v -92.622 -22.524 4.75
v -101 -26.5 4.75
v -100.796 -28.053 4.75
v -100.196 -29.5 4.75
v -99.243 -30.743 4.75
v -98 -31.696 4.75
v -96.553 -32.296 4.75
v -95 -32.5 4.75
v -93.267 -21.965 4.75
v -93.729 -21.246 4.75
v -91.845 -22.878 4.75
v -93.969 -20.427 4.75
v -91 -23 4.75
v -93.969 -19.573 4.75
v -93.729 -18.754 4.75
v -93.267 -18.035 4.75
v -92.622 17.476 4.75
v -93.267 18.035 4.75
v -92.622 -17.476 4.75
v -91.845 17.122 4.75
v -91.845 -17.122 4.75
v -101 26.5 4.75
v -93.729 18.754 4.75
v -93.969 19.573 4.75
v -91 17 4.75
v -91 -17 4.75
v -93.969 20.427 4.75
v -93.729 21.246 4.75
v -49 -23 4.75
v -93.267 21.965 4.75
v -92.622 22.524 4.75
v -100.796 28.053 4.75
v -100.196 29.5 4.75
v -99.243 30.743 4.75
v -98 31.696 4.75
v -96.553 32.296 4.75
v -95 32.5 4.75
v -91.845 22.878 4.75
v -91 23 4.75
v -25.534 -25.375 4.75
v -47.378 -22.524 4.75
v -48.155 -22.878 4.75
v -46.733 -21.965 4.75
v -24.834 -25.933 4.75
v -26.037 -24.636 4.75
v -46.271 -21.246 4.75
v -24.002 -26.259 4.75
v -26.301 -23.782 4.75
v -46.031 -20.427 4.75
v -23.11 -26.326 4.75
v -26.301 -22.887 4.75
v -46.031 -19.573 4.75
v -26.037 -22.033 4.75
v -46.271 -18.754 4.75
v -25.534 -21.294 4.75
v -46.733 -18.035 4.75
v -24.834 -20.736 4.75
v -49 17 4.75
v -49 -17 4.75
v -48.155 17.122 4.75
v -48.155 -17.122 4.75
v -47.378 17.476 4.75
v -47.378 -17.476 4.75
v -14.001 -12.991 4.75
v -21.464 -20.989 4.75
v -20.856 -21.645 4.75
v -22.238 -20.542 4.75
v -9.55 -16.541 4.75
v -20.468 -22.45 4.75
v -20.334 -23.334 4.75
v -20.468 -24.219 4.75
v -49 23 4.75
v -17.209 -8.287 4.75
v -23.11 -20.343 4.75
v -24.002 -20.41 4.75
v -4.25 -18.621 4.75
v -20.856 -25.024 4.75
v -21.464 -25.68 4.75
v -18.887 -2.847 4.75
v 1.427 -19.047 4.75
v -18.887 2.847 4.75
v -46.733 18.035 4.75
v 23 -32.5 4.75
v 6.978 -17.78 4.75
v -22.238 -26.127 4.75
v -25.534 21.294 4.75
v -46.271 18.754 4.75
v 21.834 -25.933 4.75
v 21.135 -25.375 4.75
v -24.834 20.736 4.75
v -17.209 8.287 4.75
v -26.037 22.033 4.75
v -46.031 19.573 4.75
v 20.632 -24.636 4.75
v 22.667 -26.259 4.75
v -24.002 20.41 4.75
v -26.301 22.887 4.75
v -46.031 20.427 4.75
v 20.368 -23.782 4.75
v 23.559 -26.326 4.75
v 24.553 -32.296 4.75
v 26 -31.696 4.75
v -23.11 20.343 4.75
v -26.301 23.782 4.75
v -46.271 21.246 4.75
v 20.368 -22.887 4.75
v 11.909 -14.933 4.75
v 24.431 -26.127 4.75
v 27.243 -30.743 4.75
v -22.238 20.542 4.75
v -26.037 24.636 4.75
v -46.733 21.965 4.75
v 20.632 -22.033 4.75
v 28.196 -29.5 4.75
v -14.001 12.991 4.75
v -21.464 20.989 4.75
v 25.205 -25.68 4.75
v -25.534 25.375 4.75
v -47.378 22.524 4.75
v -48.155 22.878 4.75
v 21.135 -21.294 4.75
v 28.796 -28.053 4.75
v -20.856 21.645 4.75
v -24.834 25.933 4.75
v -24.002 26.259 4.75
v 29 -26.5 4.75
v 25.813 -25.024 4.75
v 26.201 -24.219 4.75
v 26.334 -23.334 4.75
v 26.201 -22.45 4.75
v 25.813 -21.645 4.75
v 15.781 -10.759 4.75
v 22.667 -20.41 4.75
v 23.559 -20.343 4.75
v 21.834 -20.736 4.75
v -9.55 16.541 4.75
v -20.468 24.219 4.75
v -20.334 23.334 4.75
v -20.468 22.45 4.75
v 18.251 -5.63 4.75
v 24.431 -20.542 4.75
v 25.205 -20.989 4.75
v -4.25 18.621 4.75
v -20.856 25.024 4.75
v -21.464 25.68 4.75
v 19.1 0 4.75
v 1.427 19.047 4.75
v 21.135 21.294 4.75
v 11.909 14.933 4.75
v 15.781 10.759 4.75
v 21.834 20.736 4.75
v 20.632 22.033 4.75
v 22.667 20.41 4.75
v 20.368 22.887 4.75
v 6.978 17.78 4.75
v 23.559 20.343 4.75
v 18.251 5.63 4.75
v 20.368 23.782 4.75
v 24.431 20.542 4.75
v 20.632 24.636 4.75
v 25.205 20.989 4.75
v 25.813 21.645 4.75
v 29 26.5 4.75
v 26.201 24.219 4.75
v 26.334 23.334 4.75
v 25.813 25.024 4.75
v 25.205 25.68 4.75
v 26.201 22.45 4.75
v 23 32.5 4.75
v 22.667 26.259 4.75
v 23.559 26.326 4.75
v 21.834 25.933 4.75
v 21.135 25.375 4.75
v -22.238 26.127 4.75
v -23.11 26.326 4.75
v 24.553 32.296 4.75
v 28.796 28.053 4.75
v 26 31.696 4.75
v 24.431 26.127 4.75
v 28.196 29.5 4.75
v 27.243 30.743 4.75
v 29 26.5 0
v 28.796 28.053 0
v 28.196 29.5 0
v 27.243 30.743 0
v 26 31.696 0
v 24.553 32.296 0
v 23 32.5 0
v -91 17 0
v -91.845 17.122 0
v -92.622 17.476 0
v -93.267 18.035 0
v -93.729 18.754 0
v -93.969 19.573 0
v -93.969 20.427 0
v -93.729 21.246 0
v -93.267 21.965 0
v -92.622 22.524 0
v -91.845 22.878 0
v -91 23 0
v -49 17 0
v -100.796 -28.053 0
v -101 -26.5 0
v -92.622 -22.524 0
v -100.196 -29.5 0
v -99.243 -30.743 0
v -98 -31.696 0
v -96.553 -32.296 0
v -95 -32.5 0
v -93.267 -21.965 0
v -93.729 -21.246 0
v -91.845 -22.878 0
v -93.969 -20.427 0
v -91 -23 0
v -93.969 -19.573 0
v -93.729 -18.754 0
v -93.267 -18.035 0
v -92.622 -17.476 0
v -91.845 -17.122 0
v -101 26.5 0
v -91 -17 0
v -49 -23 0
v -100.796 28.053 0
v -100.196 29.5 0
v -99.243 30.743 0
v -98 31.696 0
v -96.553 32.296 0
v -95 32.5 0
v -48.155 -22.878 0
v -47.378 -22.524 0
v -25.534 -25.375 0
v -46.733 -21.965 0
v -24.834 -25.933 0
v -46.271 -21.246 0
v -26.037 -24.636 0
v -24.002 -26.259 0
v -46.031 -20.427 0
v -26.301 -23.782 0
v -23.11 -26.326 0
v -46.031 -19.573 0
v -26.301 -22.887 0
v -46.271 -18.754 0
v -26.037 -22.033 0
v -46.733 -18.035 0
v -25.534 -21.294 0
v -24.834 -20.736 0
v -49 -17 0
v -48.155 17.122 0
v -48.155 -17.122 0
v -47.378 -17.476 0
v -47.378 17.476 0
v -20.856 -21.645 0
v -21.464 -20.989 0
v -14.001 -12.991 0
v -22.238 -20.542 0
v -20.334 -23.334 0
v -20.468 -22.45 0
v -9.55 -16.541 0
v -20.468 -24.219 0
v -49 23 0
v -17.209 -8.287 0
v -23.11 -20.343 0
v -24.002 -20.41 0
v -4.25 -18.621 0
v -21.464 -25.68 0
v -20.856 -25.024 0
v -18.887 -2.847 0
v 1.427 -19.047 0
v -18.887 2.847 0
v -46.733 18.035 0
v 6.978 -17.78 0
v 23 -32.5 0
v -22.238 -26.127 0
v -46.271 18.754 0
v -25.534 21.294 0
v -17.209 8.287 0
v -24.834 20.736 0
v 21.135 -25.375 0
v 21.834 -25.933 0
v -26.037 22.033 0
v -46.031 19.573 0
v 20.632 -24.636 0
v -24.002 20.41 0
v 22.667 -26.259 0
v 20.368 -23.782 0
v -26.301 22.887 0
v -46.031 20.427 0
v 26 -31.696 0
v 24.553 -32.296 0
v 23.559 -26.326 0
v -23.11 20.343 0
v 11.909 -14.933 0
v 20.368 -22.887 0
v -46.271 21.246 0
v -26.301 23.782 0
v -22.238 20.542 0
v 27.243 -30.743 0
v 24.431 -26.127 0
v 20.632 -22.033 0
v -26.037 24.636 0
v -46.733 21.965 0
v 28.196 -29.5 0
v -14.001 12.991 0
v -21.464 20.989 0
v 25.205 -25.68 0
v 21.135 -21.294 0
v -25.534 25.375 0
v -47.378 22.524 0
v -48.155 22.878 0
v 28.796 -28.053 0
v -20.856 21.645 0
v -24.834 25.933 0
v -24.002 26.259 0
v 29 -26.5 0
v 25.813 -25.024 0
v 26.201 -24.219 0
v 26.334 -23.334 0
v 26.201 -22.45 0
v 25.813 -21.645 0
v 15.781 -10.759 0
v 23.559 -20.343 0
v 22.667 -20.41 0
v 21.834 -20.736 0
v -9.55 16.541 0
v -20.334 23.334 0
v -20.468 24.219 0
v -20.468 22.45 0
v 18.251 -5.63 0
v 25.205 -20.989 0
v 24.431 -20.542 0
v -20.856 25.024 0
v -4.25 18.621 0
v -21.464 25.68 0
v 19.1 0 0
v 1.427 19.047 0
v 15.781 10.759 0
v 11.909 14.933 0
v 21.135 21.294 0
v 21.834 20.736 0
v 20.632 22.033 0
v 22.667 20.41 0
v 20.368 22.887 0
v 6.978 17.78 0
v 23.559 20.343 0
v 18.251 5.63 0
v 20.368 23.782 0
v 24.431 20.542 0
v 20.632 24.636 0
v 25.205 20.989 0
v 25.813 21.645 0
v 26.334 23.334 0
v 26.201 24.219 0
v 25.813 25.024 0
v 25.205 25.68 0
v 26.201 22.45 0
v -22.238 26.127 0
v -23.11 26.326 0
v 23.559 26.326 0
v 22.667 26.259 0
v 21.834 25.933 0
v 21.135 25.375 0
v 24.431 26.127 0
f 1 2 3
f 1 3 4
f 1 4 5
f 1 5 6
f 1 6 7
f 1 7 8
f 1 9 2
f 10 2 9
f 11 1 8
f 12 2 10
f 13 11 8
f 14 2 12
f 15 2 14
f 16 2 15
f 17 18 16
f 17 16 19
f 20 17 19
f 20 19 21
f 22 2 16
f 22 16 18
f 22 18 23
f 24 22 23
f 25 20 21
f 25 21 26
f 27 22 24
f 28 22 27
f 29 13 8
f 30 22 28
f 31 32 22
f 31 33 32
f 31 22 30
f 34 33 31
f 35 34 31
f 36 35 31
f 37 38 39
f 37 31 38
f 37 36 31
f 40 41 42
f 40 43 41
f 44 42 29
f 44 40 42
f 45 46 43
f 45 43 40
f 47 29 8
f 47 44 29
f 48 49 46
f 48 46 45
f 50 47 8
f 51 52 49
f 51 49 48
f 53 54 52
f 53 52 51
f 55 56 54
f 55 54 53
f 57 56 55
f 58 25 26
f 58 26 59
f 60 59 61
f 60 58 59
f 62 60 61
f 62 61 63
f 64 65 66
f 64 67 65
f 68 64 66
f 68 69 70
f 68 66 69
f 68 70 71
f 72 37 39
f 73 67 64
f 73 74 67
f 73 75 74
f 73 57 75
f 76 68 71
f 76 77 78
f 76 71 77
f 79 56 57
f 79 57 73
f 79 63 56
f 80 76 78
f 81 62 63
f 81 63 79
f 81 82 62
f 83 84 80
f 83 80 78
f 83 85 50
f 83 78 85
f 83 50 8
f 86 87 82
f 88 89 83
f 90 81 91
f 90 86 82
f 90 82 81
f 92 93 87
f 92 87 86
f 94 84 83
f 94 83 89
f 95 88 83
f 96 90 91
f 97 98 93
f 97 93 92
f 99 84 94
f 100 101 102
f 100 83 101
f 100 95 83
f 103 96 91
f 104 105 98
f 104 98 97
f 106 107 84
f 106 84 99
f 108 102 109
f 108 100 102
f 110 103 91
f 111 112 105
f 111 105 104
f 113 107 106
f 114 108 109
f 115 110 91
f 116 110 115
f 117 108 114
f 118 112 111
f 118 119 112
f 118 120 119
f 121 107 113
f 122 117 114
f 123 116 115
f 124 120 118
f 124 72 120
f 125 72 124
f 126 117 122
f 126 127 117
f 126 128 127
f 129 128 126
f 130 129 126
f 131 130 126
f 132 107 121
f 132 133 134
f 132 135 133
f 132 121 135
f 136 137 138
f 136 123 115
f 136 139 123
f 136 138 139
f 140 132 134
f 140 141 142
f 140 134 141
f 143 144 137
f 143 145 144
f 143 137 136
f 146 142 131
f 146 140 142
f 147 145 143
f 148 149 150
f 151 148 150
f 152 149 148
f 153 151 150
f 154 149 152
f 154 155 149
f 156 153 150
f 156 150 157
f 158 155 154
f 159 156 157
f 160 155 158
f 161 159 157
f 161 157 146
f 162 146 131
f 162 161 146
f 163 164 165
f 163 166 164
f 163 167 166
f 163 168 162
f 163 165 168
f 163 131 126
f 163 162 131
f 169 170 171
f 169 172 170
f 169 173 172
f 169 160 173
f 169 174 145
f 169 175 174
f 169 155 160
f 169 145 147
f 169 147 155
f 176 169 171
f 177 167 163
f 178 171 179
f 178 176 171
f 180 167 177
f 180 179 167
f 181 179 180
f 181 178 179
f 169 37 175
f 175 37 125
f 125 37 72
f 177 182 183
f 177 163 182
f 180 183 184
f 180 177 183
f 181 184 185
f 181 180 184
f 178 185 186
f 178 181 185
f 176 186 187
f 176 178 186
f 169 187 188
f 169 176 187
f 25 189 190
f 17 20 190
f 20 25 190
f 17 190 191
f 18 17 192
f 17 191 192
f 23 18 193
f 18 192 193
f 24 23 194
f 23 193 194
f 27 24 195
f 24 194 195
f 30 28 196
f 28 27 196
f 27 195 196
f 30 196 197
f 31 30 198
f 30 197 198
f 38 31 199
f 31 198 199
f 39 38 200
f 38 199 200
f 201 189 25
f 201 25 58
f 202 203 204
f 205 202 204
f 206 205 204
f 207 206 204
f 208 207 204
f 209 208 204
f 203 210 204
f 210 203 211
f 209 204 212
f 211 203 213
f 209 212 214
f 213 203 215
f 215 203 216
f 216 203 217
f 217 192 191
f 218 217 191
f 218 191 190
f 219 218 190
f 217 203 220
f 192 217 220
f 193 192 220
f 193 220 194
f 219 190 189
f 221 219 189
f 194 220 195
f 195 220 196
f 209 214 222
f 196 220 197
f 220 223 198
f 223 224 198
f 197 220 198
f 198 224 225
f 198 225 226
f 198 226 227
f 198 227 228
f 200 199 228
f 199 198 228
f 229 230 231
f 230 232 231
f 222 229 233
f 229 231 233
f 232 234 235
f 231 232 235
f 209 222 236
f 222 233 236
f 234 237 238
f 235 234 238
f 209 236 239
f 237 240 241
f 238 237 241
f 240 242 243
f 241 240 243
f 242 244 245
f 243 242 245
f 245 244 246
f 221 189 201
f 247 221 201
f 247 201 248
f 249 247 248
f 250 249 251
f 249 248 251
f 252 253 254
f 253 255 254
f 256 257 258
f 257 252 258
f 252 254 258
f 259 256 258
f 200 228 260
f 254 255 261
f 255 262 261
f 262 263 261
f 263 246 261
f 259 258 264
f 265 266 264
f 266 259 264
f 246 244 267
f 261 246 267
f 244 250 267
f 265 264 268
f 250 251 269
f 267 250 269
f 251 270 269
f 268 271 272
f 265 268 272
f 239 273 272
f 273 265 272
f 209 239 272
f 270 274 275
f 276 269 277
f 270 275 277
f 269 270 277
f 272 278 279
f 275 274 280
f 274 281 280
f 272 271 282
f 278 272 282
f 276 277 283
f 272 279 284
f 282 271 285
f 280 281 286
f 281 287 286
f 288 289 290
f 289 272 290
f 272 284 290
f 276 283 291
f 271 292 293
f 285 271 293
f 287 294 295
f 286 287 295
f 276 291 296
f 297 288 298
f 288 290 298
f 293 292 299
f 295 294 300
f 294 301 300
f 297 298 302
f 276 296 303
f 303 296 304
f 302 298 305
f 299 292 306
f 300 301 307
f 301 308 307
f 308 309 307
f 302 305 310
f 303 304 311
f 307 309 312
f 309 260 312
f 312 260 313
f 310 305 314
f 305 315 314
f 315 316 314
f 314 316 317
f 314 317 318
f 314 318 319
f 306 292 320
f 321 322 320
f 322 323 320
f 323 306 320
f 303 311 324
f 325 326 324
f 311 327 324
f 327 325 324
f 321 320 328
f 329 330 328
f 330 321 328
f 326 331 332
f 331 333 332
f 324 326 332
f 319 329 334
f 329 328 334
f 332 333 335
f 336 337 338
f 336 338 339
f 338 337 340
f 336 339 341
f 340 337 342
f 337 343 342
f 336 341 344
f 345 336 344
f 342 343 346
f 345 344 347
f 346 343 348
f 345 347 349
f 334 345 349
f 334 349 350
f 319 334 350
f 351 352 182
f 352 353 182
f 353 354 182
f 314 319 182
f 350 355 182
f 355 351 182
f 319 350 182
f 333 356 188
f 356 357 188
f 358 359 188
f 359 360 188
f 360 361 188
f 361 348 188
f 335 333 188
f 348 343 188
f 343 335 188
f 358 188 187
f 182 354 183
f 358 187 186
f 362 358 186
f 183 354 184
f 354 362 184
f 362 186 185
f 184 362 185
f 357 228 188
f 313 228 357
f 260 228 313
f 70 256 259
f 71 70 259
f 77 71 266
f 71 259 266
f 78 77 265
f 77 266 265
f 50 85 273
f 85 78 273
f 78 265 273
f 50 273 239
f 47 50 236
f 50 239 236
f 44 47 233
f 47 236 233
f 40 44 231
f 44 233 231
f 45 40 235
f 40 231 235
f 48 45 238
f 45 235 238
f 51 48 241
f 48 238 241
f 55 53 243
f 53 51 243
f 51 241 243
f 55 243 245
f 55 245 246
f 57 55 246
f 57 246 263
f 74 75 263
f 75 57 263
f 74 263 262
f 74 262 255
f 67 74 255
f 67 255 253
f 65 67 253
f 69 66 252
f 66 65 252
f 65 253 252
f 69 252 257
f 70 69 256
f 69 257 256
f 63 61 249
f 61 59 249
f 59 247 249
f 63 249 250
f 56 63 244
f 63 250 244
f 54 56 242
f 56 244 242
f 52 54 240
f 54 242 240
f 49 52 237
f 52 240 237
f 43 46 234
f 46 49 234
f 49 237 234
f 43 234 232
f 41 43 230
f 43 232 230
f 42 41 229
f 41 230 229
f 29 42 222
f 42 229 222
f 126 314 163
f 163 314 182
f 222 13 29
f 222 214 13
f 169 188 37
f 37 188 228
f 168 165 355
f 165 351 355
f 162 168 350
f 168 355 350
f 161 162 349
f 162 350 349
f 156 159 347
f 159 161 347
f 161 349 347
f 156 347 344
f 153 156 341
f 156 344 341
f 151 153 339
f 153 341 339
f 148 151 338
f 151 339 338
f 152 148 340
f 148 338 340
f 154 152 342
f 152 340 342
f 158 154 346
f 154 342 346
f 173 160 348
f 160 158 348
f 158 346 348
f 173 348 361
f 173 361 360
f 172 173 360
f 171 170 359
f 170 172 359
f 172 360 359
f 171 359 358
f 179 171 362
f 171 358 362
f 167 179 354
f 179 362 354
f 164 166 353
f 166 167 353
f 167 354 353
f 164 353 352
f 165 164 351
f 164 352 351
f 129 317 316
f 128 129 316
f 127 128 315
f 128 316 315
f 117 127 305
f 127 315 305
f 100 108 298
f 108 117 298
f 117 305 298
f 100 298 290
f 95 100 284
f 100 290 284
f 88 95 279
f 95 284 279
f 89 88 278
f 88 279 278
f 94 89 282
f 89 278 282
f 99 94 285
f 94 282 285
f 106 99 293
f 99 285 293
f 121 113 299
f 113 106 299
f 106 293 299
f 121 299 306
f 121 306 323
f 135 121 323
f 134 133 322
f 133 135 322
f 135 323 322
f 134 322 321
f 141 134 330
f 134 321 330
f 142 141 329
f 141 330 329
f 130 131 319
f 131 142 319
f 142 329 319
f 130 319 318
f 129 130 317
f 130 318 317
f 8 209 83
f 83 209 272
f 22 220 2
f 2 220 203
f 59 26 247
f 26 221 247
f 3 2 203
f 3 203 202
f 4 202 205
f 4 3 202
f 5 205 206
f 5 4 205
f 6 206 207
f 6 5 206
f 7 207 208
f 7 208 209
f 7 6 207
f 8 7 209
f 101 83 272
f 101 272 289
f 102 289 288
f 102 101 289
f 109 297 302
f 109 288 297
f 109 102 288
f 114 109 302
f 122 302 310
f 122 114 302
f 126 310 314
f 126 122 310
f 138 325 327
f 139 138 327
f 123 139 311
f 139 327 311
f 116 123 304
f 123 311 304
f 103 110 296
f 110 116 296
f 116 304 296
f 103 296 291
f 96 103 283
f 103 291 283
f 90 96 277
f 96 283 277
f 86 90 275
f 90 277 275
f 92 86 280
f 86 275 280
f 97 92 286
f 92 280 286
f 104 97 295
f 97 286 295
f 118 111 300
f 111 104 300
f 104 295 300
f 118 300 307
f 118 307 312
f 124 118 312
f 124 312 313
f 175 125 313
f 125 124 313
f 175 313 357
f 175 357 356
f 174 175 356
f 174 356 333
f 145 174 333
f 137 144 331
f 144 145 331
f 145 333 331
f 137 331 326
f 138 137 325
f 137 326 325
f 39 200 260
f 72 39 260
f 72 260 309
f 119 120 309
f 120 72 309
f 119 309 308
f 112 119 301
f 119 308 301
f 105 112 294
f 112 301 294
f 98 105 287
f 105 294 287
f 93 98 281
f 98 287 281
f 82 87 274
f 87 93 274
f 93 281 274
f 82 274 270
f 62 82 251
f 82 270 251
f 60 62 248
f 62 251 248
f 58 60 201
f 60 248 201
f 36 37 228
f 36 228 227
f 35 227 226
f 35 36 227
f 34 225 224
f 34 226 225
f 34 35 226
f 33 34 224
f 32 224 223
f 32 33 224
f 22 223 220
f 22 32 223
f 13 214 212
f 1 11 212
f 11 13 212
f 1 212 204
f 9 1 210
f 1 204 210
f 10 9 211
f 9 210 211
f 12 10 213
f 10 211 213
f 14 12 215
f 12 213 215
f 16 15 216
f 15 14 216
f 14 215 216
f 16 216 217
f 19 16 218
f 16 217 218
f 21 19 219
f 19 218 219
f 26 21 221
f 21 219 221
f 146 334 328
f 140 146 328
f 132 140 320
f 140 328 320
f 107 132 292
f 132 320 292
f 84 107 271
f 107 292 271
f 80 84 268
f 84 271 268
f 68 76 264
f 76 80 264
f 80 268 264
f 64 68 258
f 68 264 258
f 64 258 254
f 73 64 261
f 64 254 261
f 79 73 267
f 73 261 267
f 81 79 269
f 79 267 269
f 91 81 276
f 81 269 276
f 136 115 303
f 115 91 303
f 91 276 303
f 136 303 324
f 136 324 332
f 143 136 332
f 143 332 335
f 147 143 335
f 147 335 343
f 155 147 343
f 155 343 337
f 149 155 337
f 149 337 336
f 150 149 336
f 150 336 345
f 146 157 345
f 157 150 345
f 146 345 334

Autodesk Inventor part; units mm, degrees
ref_plane "YZ Plane" through (0, 0, 0) normal (1, 0, 0) x (0, 1, 0)
ref_plane "XZ Plane" through (0, 0, 0) normal (0, 1, 0) x (-1, 0, 0)
ref_plane "XY Plane" through (0, 0, 0) normal (0, 0, 1) x (1, 0, 0)
sketch "Sketch1" plane through (0, 0, 0) normal (0, 0, 1) x (1, 0, 0)
  circle A0 centre (0, 0) radius 33 construction
  circle A1 centre (0, 0) radius 19.1
  line L0 (-101, -32.5) -> (29, -32.5)
  line L1 (29, -32.5) -> (29, 32.5)
  line L2 (29, 32.5) -> (-101, 32.5)
  line L3 (-101, 32.5) -> (-101, -32.5)
  line L4 (-101, -32.5) -> (29, 32.5) construction
  line L5 (29, -32.5) -> (-101, 32.5) construction
  line L6 (-101, 0) -> (29, 0) construction
  arc A2 (-91, 23) -> (-91, 17) centre (-91, 20) ccw
  line L7 (-91, 20) -> (-49, 20) construction
  arc A3 (-52, 20) -> (-49, 17) centre (-49, 20) ccw construction
  line L8 (-91, 23) -> (-49, 23)
  line L9 (-91, 17) -> (-49, 17)
  arc A4 (-88, 20) -> (-91, 23) centre (-91, 20) ccw construction
  arc A5 (-91, 17) -> (-88, 20) centre (-91, 20) ccw construction
  arc A6 (-49, 23) -> (-52, 20) centre (-49, 20) ccw construction
  arc A7 (-49, 17) -> (-49, 23) centre (-49, 20) ccw
  arc A8 (-91, -17) -> (-91, -23) centre (-91, -20) ccw
  line L10 (-91, -23) -> (-49, -23)
  line L11 (-91, -17) -> (-49, -17)
  arc A9 (-49, -23) -> (-49, -17) centre (-49, -20) ccw
  line L12 (23.3345, -23.3345) -> (-23.3345, 23.3345) construction
  line L13 (-23.3345, -23.3345) -> (23.3345, 23.3345) construction
  circle A10 centre (23.3345, 23.3345) radius 3
  circle A11 centre (-23.3345, 23.3345) radius 3
  circle A12 centre (-23.3345, -23.3345) radius 3
  circle A13 centre (23.3345, -23.3345) radius 3
  point P0 (-36, 0)
  dimension "d0" = 66
  dimension "d1" = 38.2
  dimension "d2" = 130
  dimension "d3" = 65
  dimension "d4" = 101
  dimension "d5" = 6
  dimension "d6" = 10
  dimension "d7" = 52
  dimension "d8" = 40
  dimension "d9" = 45
extrude "Plate1" add sketch "Sketch1" along normal blind 4.75
fillet "Corner Round1" radius 6 4 edges at (29, 32.5, 2.375) (29, -32.5, 2.375) (-101, -32.5, 2.375) (-101, 32.5, 2.375)
equation "\"BendRadius\" = Thickness"
equation "\"BendReliefWidth\" = Thickness"
equation "\"BendReliefDepth\" = 0.5 * Thickness"
equation "\"CornerReliefSize\" = 4 * Thickness"
equation "\"MinimumRemnant\" = 2 * Thickness"
equation "\"TransitionRadius\" = BendRadius"
equation "\"JacobiRadiusSize\" = BendRadius"
equation "\"GapSize\" = Thickness"
equation "\"d10\" = BendRadius"
equation "\"Thickness\" = 4.75"
properties part number "nema_support_1" material "Steel, Carbon"
